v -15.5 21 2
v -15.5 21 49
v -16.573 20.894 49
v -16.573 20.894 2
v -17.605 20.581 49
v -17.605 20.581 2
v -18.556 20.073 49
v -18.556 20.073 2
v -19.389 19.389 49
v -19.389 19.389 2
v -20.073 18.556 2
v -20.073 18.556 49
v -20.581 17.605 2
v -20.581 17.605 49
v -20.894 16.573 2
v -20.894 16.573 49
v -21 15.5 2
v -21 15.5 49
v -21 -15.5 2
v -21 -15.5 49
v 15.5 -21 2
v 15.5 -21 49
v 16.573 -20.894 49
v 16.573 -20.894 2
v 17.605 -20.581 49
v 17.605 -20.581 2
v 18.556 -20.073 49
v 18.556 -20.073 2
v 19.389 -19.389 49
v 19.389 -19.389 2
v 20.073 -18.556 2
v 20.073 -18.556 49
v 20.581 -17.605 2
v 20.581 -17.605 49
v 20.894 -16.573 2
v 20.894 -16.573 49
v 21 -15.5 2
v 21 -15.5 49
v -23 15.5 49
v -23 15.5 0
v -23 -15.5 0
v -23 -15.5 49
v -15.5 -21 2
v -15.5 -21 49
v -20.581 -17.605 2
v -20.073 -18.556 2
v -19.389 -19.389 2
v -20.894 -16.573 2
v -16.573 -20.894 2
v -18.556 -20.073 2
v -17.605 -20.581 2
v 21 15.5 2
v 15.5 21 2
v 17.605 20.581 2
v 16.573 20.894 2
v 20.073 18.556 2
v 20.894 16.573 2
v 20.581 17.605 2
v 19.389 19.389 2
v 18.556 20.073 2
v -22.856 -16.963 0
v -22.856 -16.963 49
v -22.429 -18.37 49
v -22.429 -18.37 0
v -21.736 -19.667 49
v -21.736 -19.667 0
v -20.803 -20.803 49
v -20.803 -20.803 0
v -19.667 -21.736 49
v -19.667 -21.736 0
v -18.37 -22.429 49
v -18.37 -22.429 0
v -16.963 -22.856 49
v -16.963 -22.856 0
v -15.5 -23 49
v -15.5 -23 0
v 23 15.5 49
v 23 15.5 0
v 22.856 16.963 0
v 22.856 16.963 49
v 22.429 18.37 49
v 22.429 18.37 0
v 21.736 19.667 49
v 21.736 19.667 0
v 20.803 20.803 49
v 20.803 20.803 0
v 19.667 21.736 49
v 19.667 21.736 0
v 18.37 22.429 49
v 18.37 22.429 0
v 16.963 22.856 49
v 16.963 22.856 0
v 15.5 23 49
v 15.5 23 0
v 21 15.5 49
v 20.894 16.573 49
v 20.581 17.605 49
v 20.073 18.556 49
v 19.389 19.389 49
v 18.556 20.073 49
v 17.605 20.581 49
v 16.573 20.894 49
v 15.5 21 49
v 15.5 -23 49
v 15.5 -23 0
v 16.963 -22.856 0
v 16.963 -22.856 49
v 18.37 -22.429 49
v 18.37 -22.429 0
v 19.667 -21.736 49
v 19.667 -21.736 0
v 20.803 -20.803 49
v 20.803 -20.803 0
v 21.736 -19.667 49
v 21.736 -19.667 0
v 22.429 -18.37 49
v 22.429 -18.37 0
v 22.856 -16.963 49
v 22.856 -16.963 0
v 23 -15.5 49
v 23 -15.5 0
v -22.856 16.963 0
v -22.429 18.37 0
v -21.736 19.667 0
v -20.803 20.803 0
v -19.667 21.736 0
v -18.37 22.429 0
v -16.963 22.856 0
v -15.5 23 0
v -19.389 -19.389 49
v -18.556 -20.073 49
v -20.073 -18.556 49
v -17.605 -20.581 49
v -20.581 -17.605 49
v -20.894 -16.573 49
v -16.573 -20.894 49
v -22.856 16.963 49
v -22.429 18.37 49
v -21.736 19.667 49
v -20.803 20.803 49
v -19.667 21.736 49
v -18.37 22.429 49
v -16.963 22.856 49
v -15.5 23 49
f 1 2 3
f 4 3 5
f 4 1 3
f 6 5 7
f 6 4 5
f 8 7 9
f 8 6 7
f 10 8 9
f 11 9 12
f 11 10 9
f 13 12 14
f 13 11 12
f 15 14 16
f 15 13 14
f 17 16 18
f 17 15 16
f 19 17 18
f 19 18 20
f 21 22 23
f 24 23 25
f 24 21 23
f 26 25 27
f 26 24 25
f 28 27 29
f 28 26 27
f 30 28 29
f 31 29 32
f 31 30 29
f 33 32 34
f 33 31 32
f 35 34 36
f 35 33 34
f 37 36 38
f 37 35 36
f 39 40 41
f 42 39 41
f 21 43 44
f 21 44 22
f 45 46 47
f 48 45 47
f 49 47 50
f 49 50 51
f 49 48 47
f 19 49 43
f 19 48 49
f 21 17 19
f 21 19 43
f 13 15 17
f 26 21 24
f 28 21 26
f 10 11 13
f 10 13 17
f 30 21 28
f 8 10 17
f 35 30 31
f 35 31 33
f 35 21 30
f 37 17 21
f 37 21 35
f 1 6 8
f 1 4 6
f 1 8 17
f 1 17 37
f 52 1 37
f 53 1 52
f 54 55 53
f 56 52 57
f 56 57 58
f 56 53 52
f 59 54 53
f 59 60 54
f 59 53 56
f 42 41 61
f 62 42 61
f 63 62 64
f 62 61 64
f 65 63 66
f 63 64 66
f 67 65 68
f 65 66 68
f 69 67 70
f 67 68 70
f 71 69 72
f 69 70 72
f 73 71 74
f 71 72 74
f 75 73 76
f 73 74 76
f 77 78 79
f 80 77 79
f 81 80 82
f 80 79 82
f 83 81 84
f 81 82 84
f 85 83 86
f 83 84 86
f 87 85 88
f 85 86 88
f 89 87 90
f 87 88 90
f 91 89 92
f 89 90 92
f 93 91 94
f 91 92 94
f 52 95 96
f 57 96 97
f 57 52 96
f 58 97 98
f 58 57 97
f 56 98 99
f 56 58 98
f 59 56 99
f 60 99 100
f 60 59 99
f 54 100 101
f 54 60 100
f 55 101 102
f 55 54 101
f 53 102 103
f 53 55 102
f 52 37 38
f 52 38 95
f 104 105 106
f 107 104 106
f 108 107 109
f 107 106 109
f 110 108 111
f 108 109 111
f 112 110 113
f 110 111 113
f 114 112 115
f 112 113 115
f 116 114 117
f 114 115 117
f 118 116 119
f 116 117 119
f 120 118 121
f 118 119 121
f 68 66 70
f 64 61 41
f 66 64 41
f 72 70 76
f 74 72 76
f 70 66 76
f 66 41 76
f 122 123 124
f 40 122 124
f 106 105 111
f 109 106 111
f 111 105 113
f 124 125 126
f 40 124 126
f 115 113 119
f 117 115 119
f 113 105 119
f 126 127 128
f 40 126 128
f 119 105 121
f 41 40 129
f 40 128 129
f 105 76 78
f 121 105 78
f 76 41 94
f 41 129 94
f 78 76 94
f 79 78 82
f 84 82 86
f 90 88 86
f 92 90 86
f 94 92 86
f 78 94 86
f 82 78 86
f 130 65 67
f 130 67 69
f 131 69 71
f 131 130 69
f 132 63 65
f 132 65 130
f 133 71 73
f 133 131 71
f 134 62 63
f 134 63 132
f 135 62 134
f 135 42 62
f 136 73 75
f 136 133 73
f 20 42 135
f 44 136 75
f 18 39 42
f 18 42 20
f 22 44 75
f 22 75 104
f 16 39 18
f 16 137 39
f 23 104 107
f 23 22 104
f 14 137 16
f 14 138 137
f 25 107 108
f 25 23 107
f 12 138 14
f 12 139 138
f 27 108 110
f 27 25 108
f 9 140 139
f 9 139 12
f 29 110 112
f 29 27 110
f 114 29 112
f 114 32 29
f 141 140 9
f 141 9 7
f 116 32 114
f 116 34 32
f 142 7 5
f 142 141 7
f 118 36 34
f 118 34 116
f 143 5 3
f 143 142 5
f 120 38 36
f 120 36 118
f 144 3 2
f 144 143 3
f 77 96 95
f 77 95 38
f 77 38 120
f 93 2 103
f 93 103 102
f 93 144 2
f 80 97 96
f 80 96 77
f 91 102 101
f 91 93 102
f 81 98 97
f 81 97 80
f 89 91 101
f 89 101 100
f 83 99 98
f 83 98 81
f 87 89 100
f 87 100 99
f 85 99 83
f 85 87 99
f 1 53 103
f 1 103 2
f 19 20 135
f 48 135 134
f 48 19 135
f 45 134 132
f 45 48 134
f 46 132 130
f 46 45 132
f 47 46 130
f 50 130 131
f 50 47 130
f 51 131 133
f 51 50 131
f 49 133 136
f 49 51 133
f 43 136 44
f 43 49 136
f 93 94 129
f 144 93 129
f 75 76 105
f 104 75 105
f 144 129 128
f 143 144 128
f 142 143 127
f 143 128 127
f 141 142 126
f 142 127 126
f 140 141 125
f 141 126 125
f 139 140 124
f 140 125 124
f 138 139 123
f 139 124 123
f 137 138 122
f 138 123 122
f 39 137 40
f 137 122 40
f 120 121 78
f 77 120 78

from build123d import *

# Parameters (mm, degrees)
SKETCH1_W           = 42
SKETCH1_H           = 42
BOSS_EXTRUDE1_DEPTH = 2
FILLET1_R           = 5.5
BOSS_EXTRUDE2_DEPTH = 49


with BuildPart() as part:
    # Sketch1 → Boss-Extrude1 (new body)
    with BuildSketch(Plane.XY):
        Rectangle(SKETCH1_W, SKETCH1_H)
    extrude(amount=BOSS_EXTRUDE1_DEPTH)

    # Fillet1
    fillet1_edges = [part.edges().sort_by_distance(p)[0] for p in [
        (-21, 21, 1),
        (21, 21, 1),
        (21, -21, 1),
        (-21, -21, 1),
    ]]
    fillet(fillet1_edges, radius=FILLET1_R)

    # Sketch2 → Boss-Extrude2 (add)
    with BuildSketch(Plane.XY):
        with BuildLine():
            Line((-23, 15.5), (-23, -15.5))
            ThreePointArc((-23, -15.5), (-20.803300859, -20.803300859), (-15.5, -23))
            Line((-15.5, -23), (15.5, -23))
            ThreePointArc((15.5, -23), (20.803300859, -20.803300859), (23, -15.5))
            Line((23, -15.5), (23, 15.5))
            ThreePointArc((23, 15.5), (20.803300859, 20.803300859), (15.5, 23))
            Line((15.5, 23), (-15.5, 23))
            ThreePointArc((-15.5, 23), (-20.803300859, 20.803300859), (-23, 15.5))
        make_face()
        with BuildLine():
            Line((-21, 15.5), (-21, -15.5))
            ThreePointArc((-21, -15.5), (-19.389087297, -19.389087297), (-15.5, -21))
            Line((-15.5, -21), (15.5, -21))
            ThreePointArc((15.5, -21), (19.389087297, -19.389087297), (21, -15.5))
            Line((21, -15.5), (21, 15.5))
            ThreePointArc((21, 15.5), (19.389087297, 19.389087297), (15.5, 21))
            Line((15.5, 21), (-15.5, 21))
            ThreePointArc((-15.5, 21), (-19.389087297, 19.389087297), (-21, 15.5))
        make_face(mode=Mode.SUBTRACT)
    extrude(amount=BOSS_EXTRUDE2_DEPTH)


solid = part.part
